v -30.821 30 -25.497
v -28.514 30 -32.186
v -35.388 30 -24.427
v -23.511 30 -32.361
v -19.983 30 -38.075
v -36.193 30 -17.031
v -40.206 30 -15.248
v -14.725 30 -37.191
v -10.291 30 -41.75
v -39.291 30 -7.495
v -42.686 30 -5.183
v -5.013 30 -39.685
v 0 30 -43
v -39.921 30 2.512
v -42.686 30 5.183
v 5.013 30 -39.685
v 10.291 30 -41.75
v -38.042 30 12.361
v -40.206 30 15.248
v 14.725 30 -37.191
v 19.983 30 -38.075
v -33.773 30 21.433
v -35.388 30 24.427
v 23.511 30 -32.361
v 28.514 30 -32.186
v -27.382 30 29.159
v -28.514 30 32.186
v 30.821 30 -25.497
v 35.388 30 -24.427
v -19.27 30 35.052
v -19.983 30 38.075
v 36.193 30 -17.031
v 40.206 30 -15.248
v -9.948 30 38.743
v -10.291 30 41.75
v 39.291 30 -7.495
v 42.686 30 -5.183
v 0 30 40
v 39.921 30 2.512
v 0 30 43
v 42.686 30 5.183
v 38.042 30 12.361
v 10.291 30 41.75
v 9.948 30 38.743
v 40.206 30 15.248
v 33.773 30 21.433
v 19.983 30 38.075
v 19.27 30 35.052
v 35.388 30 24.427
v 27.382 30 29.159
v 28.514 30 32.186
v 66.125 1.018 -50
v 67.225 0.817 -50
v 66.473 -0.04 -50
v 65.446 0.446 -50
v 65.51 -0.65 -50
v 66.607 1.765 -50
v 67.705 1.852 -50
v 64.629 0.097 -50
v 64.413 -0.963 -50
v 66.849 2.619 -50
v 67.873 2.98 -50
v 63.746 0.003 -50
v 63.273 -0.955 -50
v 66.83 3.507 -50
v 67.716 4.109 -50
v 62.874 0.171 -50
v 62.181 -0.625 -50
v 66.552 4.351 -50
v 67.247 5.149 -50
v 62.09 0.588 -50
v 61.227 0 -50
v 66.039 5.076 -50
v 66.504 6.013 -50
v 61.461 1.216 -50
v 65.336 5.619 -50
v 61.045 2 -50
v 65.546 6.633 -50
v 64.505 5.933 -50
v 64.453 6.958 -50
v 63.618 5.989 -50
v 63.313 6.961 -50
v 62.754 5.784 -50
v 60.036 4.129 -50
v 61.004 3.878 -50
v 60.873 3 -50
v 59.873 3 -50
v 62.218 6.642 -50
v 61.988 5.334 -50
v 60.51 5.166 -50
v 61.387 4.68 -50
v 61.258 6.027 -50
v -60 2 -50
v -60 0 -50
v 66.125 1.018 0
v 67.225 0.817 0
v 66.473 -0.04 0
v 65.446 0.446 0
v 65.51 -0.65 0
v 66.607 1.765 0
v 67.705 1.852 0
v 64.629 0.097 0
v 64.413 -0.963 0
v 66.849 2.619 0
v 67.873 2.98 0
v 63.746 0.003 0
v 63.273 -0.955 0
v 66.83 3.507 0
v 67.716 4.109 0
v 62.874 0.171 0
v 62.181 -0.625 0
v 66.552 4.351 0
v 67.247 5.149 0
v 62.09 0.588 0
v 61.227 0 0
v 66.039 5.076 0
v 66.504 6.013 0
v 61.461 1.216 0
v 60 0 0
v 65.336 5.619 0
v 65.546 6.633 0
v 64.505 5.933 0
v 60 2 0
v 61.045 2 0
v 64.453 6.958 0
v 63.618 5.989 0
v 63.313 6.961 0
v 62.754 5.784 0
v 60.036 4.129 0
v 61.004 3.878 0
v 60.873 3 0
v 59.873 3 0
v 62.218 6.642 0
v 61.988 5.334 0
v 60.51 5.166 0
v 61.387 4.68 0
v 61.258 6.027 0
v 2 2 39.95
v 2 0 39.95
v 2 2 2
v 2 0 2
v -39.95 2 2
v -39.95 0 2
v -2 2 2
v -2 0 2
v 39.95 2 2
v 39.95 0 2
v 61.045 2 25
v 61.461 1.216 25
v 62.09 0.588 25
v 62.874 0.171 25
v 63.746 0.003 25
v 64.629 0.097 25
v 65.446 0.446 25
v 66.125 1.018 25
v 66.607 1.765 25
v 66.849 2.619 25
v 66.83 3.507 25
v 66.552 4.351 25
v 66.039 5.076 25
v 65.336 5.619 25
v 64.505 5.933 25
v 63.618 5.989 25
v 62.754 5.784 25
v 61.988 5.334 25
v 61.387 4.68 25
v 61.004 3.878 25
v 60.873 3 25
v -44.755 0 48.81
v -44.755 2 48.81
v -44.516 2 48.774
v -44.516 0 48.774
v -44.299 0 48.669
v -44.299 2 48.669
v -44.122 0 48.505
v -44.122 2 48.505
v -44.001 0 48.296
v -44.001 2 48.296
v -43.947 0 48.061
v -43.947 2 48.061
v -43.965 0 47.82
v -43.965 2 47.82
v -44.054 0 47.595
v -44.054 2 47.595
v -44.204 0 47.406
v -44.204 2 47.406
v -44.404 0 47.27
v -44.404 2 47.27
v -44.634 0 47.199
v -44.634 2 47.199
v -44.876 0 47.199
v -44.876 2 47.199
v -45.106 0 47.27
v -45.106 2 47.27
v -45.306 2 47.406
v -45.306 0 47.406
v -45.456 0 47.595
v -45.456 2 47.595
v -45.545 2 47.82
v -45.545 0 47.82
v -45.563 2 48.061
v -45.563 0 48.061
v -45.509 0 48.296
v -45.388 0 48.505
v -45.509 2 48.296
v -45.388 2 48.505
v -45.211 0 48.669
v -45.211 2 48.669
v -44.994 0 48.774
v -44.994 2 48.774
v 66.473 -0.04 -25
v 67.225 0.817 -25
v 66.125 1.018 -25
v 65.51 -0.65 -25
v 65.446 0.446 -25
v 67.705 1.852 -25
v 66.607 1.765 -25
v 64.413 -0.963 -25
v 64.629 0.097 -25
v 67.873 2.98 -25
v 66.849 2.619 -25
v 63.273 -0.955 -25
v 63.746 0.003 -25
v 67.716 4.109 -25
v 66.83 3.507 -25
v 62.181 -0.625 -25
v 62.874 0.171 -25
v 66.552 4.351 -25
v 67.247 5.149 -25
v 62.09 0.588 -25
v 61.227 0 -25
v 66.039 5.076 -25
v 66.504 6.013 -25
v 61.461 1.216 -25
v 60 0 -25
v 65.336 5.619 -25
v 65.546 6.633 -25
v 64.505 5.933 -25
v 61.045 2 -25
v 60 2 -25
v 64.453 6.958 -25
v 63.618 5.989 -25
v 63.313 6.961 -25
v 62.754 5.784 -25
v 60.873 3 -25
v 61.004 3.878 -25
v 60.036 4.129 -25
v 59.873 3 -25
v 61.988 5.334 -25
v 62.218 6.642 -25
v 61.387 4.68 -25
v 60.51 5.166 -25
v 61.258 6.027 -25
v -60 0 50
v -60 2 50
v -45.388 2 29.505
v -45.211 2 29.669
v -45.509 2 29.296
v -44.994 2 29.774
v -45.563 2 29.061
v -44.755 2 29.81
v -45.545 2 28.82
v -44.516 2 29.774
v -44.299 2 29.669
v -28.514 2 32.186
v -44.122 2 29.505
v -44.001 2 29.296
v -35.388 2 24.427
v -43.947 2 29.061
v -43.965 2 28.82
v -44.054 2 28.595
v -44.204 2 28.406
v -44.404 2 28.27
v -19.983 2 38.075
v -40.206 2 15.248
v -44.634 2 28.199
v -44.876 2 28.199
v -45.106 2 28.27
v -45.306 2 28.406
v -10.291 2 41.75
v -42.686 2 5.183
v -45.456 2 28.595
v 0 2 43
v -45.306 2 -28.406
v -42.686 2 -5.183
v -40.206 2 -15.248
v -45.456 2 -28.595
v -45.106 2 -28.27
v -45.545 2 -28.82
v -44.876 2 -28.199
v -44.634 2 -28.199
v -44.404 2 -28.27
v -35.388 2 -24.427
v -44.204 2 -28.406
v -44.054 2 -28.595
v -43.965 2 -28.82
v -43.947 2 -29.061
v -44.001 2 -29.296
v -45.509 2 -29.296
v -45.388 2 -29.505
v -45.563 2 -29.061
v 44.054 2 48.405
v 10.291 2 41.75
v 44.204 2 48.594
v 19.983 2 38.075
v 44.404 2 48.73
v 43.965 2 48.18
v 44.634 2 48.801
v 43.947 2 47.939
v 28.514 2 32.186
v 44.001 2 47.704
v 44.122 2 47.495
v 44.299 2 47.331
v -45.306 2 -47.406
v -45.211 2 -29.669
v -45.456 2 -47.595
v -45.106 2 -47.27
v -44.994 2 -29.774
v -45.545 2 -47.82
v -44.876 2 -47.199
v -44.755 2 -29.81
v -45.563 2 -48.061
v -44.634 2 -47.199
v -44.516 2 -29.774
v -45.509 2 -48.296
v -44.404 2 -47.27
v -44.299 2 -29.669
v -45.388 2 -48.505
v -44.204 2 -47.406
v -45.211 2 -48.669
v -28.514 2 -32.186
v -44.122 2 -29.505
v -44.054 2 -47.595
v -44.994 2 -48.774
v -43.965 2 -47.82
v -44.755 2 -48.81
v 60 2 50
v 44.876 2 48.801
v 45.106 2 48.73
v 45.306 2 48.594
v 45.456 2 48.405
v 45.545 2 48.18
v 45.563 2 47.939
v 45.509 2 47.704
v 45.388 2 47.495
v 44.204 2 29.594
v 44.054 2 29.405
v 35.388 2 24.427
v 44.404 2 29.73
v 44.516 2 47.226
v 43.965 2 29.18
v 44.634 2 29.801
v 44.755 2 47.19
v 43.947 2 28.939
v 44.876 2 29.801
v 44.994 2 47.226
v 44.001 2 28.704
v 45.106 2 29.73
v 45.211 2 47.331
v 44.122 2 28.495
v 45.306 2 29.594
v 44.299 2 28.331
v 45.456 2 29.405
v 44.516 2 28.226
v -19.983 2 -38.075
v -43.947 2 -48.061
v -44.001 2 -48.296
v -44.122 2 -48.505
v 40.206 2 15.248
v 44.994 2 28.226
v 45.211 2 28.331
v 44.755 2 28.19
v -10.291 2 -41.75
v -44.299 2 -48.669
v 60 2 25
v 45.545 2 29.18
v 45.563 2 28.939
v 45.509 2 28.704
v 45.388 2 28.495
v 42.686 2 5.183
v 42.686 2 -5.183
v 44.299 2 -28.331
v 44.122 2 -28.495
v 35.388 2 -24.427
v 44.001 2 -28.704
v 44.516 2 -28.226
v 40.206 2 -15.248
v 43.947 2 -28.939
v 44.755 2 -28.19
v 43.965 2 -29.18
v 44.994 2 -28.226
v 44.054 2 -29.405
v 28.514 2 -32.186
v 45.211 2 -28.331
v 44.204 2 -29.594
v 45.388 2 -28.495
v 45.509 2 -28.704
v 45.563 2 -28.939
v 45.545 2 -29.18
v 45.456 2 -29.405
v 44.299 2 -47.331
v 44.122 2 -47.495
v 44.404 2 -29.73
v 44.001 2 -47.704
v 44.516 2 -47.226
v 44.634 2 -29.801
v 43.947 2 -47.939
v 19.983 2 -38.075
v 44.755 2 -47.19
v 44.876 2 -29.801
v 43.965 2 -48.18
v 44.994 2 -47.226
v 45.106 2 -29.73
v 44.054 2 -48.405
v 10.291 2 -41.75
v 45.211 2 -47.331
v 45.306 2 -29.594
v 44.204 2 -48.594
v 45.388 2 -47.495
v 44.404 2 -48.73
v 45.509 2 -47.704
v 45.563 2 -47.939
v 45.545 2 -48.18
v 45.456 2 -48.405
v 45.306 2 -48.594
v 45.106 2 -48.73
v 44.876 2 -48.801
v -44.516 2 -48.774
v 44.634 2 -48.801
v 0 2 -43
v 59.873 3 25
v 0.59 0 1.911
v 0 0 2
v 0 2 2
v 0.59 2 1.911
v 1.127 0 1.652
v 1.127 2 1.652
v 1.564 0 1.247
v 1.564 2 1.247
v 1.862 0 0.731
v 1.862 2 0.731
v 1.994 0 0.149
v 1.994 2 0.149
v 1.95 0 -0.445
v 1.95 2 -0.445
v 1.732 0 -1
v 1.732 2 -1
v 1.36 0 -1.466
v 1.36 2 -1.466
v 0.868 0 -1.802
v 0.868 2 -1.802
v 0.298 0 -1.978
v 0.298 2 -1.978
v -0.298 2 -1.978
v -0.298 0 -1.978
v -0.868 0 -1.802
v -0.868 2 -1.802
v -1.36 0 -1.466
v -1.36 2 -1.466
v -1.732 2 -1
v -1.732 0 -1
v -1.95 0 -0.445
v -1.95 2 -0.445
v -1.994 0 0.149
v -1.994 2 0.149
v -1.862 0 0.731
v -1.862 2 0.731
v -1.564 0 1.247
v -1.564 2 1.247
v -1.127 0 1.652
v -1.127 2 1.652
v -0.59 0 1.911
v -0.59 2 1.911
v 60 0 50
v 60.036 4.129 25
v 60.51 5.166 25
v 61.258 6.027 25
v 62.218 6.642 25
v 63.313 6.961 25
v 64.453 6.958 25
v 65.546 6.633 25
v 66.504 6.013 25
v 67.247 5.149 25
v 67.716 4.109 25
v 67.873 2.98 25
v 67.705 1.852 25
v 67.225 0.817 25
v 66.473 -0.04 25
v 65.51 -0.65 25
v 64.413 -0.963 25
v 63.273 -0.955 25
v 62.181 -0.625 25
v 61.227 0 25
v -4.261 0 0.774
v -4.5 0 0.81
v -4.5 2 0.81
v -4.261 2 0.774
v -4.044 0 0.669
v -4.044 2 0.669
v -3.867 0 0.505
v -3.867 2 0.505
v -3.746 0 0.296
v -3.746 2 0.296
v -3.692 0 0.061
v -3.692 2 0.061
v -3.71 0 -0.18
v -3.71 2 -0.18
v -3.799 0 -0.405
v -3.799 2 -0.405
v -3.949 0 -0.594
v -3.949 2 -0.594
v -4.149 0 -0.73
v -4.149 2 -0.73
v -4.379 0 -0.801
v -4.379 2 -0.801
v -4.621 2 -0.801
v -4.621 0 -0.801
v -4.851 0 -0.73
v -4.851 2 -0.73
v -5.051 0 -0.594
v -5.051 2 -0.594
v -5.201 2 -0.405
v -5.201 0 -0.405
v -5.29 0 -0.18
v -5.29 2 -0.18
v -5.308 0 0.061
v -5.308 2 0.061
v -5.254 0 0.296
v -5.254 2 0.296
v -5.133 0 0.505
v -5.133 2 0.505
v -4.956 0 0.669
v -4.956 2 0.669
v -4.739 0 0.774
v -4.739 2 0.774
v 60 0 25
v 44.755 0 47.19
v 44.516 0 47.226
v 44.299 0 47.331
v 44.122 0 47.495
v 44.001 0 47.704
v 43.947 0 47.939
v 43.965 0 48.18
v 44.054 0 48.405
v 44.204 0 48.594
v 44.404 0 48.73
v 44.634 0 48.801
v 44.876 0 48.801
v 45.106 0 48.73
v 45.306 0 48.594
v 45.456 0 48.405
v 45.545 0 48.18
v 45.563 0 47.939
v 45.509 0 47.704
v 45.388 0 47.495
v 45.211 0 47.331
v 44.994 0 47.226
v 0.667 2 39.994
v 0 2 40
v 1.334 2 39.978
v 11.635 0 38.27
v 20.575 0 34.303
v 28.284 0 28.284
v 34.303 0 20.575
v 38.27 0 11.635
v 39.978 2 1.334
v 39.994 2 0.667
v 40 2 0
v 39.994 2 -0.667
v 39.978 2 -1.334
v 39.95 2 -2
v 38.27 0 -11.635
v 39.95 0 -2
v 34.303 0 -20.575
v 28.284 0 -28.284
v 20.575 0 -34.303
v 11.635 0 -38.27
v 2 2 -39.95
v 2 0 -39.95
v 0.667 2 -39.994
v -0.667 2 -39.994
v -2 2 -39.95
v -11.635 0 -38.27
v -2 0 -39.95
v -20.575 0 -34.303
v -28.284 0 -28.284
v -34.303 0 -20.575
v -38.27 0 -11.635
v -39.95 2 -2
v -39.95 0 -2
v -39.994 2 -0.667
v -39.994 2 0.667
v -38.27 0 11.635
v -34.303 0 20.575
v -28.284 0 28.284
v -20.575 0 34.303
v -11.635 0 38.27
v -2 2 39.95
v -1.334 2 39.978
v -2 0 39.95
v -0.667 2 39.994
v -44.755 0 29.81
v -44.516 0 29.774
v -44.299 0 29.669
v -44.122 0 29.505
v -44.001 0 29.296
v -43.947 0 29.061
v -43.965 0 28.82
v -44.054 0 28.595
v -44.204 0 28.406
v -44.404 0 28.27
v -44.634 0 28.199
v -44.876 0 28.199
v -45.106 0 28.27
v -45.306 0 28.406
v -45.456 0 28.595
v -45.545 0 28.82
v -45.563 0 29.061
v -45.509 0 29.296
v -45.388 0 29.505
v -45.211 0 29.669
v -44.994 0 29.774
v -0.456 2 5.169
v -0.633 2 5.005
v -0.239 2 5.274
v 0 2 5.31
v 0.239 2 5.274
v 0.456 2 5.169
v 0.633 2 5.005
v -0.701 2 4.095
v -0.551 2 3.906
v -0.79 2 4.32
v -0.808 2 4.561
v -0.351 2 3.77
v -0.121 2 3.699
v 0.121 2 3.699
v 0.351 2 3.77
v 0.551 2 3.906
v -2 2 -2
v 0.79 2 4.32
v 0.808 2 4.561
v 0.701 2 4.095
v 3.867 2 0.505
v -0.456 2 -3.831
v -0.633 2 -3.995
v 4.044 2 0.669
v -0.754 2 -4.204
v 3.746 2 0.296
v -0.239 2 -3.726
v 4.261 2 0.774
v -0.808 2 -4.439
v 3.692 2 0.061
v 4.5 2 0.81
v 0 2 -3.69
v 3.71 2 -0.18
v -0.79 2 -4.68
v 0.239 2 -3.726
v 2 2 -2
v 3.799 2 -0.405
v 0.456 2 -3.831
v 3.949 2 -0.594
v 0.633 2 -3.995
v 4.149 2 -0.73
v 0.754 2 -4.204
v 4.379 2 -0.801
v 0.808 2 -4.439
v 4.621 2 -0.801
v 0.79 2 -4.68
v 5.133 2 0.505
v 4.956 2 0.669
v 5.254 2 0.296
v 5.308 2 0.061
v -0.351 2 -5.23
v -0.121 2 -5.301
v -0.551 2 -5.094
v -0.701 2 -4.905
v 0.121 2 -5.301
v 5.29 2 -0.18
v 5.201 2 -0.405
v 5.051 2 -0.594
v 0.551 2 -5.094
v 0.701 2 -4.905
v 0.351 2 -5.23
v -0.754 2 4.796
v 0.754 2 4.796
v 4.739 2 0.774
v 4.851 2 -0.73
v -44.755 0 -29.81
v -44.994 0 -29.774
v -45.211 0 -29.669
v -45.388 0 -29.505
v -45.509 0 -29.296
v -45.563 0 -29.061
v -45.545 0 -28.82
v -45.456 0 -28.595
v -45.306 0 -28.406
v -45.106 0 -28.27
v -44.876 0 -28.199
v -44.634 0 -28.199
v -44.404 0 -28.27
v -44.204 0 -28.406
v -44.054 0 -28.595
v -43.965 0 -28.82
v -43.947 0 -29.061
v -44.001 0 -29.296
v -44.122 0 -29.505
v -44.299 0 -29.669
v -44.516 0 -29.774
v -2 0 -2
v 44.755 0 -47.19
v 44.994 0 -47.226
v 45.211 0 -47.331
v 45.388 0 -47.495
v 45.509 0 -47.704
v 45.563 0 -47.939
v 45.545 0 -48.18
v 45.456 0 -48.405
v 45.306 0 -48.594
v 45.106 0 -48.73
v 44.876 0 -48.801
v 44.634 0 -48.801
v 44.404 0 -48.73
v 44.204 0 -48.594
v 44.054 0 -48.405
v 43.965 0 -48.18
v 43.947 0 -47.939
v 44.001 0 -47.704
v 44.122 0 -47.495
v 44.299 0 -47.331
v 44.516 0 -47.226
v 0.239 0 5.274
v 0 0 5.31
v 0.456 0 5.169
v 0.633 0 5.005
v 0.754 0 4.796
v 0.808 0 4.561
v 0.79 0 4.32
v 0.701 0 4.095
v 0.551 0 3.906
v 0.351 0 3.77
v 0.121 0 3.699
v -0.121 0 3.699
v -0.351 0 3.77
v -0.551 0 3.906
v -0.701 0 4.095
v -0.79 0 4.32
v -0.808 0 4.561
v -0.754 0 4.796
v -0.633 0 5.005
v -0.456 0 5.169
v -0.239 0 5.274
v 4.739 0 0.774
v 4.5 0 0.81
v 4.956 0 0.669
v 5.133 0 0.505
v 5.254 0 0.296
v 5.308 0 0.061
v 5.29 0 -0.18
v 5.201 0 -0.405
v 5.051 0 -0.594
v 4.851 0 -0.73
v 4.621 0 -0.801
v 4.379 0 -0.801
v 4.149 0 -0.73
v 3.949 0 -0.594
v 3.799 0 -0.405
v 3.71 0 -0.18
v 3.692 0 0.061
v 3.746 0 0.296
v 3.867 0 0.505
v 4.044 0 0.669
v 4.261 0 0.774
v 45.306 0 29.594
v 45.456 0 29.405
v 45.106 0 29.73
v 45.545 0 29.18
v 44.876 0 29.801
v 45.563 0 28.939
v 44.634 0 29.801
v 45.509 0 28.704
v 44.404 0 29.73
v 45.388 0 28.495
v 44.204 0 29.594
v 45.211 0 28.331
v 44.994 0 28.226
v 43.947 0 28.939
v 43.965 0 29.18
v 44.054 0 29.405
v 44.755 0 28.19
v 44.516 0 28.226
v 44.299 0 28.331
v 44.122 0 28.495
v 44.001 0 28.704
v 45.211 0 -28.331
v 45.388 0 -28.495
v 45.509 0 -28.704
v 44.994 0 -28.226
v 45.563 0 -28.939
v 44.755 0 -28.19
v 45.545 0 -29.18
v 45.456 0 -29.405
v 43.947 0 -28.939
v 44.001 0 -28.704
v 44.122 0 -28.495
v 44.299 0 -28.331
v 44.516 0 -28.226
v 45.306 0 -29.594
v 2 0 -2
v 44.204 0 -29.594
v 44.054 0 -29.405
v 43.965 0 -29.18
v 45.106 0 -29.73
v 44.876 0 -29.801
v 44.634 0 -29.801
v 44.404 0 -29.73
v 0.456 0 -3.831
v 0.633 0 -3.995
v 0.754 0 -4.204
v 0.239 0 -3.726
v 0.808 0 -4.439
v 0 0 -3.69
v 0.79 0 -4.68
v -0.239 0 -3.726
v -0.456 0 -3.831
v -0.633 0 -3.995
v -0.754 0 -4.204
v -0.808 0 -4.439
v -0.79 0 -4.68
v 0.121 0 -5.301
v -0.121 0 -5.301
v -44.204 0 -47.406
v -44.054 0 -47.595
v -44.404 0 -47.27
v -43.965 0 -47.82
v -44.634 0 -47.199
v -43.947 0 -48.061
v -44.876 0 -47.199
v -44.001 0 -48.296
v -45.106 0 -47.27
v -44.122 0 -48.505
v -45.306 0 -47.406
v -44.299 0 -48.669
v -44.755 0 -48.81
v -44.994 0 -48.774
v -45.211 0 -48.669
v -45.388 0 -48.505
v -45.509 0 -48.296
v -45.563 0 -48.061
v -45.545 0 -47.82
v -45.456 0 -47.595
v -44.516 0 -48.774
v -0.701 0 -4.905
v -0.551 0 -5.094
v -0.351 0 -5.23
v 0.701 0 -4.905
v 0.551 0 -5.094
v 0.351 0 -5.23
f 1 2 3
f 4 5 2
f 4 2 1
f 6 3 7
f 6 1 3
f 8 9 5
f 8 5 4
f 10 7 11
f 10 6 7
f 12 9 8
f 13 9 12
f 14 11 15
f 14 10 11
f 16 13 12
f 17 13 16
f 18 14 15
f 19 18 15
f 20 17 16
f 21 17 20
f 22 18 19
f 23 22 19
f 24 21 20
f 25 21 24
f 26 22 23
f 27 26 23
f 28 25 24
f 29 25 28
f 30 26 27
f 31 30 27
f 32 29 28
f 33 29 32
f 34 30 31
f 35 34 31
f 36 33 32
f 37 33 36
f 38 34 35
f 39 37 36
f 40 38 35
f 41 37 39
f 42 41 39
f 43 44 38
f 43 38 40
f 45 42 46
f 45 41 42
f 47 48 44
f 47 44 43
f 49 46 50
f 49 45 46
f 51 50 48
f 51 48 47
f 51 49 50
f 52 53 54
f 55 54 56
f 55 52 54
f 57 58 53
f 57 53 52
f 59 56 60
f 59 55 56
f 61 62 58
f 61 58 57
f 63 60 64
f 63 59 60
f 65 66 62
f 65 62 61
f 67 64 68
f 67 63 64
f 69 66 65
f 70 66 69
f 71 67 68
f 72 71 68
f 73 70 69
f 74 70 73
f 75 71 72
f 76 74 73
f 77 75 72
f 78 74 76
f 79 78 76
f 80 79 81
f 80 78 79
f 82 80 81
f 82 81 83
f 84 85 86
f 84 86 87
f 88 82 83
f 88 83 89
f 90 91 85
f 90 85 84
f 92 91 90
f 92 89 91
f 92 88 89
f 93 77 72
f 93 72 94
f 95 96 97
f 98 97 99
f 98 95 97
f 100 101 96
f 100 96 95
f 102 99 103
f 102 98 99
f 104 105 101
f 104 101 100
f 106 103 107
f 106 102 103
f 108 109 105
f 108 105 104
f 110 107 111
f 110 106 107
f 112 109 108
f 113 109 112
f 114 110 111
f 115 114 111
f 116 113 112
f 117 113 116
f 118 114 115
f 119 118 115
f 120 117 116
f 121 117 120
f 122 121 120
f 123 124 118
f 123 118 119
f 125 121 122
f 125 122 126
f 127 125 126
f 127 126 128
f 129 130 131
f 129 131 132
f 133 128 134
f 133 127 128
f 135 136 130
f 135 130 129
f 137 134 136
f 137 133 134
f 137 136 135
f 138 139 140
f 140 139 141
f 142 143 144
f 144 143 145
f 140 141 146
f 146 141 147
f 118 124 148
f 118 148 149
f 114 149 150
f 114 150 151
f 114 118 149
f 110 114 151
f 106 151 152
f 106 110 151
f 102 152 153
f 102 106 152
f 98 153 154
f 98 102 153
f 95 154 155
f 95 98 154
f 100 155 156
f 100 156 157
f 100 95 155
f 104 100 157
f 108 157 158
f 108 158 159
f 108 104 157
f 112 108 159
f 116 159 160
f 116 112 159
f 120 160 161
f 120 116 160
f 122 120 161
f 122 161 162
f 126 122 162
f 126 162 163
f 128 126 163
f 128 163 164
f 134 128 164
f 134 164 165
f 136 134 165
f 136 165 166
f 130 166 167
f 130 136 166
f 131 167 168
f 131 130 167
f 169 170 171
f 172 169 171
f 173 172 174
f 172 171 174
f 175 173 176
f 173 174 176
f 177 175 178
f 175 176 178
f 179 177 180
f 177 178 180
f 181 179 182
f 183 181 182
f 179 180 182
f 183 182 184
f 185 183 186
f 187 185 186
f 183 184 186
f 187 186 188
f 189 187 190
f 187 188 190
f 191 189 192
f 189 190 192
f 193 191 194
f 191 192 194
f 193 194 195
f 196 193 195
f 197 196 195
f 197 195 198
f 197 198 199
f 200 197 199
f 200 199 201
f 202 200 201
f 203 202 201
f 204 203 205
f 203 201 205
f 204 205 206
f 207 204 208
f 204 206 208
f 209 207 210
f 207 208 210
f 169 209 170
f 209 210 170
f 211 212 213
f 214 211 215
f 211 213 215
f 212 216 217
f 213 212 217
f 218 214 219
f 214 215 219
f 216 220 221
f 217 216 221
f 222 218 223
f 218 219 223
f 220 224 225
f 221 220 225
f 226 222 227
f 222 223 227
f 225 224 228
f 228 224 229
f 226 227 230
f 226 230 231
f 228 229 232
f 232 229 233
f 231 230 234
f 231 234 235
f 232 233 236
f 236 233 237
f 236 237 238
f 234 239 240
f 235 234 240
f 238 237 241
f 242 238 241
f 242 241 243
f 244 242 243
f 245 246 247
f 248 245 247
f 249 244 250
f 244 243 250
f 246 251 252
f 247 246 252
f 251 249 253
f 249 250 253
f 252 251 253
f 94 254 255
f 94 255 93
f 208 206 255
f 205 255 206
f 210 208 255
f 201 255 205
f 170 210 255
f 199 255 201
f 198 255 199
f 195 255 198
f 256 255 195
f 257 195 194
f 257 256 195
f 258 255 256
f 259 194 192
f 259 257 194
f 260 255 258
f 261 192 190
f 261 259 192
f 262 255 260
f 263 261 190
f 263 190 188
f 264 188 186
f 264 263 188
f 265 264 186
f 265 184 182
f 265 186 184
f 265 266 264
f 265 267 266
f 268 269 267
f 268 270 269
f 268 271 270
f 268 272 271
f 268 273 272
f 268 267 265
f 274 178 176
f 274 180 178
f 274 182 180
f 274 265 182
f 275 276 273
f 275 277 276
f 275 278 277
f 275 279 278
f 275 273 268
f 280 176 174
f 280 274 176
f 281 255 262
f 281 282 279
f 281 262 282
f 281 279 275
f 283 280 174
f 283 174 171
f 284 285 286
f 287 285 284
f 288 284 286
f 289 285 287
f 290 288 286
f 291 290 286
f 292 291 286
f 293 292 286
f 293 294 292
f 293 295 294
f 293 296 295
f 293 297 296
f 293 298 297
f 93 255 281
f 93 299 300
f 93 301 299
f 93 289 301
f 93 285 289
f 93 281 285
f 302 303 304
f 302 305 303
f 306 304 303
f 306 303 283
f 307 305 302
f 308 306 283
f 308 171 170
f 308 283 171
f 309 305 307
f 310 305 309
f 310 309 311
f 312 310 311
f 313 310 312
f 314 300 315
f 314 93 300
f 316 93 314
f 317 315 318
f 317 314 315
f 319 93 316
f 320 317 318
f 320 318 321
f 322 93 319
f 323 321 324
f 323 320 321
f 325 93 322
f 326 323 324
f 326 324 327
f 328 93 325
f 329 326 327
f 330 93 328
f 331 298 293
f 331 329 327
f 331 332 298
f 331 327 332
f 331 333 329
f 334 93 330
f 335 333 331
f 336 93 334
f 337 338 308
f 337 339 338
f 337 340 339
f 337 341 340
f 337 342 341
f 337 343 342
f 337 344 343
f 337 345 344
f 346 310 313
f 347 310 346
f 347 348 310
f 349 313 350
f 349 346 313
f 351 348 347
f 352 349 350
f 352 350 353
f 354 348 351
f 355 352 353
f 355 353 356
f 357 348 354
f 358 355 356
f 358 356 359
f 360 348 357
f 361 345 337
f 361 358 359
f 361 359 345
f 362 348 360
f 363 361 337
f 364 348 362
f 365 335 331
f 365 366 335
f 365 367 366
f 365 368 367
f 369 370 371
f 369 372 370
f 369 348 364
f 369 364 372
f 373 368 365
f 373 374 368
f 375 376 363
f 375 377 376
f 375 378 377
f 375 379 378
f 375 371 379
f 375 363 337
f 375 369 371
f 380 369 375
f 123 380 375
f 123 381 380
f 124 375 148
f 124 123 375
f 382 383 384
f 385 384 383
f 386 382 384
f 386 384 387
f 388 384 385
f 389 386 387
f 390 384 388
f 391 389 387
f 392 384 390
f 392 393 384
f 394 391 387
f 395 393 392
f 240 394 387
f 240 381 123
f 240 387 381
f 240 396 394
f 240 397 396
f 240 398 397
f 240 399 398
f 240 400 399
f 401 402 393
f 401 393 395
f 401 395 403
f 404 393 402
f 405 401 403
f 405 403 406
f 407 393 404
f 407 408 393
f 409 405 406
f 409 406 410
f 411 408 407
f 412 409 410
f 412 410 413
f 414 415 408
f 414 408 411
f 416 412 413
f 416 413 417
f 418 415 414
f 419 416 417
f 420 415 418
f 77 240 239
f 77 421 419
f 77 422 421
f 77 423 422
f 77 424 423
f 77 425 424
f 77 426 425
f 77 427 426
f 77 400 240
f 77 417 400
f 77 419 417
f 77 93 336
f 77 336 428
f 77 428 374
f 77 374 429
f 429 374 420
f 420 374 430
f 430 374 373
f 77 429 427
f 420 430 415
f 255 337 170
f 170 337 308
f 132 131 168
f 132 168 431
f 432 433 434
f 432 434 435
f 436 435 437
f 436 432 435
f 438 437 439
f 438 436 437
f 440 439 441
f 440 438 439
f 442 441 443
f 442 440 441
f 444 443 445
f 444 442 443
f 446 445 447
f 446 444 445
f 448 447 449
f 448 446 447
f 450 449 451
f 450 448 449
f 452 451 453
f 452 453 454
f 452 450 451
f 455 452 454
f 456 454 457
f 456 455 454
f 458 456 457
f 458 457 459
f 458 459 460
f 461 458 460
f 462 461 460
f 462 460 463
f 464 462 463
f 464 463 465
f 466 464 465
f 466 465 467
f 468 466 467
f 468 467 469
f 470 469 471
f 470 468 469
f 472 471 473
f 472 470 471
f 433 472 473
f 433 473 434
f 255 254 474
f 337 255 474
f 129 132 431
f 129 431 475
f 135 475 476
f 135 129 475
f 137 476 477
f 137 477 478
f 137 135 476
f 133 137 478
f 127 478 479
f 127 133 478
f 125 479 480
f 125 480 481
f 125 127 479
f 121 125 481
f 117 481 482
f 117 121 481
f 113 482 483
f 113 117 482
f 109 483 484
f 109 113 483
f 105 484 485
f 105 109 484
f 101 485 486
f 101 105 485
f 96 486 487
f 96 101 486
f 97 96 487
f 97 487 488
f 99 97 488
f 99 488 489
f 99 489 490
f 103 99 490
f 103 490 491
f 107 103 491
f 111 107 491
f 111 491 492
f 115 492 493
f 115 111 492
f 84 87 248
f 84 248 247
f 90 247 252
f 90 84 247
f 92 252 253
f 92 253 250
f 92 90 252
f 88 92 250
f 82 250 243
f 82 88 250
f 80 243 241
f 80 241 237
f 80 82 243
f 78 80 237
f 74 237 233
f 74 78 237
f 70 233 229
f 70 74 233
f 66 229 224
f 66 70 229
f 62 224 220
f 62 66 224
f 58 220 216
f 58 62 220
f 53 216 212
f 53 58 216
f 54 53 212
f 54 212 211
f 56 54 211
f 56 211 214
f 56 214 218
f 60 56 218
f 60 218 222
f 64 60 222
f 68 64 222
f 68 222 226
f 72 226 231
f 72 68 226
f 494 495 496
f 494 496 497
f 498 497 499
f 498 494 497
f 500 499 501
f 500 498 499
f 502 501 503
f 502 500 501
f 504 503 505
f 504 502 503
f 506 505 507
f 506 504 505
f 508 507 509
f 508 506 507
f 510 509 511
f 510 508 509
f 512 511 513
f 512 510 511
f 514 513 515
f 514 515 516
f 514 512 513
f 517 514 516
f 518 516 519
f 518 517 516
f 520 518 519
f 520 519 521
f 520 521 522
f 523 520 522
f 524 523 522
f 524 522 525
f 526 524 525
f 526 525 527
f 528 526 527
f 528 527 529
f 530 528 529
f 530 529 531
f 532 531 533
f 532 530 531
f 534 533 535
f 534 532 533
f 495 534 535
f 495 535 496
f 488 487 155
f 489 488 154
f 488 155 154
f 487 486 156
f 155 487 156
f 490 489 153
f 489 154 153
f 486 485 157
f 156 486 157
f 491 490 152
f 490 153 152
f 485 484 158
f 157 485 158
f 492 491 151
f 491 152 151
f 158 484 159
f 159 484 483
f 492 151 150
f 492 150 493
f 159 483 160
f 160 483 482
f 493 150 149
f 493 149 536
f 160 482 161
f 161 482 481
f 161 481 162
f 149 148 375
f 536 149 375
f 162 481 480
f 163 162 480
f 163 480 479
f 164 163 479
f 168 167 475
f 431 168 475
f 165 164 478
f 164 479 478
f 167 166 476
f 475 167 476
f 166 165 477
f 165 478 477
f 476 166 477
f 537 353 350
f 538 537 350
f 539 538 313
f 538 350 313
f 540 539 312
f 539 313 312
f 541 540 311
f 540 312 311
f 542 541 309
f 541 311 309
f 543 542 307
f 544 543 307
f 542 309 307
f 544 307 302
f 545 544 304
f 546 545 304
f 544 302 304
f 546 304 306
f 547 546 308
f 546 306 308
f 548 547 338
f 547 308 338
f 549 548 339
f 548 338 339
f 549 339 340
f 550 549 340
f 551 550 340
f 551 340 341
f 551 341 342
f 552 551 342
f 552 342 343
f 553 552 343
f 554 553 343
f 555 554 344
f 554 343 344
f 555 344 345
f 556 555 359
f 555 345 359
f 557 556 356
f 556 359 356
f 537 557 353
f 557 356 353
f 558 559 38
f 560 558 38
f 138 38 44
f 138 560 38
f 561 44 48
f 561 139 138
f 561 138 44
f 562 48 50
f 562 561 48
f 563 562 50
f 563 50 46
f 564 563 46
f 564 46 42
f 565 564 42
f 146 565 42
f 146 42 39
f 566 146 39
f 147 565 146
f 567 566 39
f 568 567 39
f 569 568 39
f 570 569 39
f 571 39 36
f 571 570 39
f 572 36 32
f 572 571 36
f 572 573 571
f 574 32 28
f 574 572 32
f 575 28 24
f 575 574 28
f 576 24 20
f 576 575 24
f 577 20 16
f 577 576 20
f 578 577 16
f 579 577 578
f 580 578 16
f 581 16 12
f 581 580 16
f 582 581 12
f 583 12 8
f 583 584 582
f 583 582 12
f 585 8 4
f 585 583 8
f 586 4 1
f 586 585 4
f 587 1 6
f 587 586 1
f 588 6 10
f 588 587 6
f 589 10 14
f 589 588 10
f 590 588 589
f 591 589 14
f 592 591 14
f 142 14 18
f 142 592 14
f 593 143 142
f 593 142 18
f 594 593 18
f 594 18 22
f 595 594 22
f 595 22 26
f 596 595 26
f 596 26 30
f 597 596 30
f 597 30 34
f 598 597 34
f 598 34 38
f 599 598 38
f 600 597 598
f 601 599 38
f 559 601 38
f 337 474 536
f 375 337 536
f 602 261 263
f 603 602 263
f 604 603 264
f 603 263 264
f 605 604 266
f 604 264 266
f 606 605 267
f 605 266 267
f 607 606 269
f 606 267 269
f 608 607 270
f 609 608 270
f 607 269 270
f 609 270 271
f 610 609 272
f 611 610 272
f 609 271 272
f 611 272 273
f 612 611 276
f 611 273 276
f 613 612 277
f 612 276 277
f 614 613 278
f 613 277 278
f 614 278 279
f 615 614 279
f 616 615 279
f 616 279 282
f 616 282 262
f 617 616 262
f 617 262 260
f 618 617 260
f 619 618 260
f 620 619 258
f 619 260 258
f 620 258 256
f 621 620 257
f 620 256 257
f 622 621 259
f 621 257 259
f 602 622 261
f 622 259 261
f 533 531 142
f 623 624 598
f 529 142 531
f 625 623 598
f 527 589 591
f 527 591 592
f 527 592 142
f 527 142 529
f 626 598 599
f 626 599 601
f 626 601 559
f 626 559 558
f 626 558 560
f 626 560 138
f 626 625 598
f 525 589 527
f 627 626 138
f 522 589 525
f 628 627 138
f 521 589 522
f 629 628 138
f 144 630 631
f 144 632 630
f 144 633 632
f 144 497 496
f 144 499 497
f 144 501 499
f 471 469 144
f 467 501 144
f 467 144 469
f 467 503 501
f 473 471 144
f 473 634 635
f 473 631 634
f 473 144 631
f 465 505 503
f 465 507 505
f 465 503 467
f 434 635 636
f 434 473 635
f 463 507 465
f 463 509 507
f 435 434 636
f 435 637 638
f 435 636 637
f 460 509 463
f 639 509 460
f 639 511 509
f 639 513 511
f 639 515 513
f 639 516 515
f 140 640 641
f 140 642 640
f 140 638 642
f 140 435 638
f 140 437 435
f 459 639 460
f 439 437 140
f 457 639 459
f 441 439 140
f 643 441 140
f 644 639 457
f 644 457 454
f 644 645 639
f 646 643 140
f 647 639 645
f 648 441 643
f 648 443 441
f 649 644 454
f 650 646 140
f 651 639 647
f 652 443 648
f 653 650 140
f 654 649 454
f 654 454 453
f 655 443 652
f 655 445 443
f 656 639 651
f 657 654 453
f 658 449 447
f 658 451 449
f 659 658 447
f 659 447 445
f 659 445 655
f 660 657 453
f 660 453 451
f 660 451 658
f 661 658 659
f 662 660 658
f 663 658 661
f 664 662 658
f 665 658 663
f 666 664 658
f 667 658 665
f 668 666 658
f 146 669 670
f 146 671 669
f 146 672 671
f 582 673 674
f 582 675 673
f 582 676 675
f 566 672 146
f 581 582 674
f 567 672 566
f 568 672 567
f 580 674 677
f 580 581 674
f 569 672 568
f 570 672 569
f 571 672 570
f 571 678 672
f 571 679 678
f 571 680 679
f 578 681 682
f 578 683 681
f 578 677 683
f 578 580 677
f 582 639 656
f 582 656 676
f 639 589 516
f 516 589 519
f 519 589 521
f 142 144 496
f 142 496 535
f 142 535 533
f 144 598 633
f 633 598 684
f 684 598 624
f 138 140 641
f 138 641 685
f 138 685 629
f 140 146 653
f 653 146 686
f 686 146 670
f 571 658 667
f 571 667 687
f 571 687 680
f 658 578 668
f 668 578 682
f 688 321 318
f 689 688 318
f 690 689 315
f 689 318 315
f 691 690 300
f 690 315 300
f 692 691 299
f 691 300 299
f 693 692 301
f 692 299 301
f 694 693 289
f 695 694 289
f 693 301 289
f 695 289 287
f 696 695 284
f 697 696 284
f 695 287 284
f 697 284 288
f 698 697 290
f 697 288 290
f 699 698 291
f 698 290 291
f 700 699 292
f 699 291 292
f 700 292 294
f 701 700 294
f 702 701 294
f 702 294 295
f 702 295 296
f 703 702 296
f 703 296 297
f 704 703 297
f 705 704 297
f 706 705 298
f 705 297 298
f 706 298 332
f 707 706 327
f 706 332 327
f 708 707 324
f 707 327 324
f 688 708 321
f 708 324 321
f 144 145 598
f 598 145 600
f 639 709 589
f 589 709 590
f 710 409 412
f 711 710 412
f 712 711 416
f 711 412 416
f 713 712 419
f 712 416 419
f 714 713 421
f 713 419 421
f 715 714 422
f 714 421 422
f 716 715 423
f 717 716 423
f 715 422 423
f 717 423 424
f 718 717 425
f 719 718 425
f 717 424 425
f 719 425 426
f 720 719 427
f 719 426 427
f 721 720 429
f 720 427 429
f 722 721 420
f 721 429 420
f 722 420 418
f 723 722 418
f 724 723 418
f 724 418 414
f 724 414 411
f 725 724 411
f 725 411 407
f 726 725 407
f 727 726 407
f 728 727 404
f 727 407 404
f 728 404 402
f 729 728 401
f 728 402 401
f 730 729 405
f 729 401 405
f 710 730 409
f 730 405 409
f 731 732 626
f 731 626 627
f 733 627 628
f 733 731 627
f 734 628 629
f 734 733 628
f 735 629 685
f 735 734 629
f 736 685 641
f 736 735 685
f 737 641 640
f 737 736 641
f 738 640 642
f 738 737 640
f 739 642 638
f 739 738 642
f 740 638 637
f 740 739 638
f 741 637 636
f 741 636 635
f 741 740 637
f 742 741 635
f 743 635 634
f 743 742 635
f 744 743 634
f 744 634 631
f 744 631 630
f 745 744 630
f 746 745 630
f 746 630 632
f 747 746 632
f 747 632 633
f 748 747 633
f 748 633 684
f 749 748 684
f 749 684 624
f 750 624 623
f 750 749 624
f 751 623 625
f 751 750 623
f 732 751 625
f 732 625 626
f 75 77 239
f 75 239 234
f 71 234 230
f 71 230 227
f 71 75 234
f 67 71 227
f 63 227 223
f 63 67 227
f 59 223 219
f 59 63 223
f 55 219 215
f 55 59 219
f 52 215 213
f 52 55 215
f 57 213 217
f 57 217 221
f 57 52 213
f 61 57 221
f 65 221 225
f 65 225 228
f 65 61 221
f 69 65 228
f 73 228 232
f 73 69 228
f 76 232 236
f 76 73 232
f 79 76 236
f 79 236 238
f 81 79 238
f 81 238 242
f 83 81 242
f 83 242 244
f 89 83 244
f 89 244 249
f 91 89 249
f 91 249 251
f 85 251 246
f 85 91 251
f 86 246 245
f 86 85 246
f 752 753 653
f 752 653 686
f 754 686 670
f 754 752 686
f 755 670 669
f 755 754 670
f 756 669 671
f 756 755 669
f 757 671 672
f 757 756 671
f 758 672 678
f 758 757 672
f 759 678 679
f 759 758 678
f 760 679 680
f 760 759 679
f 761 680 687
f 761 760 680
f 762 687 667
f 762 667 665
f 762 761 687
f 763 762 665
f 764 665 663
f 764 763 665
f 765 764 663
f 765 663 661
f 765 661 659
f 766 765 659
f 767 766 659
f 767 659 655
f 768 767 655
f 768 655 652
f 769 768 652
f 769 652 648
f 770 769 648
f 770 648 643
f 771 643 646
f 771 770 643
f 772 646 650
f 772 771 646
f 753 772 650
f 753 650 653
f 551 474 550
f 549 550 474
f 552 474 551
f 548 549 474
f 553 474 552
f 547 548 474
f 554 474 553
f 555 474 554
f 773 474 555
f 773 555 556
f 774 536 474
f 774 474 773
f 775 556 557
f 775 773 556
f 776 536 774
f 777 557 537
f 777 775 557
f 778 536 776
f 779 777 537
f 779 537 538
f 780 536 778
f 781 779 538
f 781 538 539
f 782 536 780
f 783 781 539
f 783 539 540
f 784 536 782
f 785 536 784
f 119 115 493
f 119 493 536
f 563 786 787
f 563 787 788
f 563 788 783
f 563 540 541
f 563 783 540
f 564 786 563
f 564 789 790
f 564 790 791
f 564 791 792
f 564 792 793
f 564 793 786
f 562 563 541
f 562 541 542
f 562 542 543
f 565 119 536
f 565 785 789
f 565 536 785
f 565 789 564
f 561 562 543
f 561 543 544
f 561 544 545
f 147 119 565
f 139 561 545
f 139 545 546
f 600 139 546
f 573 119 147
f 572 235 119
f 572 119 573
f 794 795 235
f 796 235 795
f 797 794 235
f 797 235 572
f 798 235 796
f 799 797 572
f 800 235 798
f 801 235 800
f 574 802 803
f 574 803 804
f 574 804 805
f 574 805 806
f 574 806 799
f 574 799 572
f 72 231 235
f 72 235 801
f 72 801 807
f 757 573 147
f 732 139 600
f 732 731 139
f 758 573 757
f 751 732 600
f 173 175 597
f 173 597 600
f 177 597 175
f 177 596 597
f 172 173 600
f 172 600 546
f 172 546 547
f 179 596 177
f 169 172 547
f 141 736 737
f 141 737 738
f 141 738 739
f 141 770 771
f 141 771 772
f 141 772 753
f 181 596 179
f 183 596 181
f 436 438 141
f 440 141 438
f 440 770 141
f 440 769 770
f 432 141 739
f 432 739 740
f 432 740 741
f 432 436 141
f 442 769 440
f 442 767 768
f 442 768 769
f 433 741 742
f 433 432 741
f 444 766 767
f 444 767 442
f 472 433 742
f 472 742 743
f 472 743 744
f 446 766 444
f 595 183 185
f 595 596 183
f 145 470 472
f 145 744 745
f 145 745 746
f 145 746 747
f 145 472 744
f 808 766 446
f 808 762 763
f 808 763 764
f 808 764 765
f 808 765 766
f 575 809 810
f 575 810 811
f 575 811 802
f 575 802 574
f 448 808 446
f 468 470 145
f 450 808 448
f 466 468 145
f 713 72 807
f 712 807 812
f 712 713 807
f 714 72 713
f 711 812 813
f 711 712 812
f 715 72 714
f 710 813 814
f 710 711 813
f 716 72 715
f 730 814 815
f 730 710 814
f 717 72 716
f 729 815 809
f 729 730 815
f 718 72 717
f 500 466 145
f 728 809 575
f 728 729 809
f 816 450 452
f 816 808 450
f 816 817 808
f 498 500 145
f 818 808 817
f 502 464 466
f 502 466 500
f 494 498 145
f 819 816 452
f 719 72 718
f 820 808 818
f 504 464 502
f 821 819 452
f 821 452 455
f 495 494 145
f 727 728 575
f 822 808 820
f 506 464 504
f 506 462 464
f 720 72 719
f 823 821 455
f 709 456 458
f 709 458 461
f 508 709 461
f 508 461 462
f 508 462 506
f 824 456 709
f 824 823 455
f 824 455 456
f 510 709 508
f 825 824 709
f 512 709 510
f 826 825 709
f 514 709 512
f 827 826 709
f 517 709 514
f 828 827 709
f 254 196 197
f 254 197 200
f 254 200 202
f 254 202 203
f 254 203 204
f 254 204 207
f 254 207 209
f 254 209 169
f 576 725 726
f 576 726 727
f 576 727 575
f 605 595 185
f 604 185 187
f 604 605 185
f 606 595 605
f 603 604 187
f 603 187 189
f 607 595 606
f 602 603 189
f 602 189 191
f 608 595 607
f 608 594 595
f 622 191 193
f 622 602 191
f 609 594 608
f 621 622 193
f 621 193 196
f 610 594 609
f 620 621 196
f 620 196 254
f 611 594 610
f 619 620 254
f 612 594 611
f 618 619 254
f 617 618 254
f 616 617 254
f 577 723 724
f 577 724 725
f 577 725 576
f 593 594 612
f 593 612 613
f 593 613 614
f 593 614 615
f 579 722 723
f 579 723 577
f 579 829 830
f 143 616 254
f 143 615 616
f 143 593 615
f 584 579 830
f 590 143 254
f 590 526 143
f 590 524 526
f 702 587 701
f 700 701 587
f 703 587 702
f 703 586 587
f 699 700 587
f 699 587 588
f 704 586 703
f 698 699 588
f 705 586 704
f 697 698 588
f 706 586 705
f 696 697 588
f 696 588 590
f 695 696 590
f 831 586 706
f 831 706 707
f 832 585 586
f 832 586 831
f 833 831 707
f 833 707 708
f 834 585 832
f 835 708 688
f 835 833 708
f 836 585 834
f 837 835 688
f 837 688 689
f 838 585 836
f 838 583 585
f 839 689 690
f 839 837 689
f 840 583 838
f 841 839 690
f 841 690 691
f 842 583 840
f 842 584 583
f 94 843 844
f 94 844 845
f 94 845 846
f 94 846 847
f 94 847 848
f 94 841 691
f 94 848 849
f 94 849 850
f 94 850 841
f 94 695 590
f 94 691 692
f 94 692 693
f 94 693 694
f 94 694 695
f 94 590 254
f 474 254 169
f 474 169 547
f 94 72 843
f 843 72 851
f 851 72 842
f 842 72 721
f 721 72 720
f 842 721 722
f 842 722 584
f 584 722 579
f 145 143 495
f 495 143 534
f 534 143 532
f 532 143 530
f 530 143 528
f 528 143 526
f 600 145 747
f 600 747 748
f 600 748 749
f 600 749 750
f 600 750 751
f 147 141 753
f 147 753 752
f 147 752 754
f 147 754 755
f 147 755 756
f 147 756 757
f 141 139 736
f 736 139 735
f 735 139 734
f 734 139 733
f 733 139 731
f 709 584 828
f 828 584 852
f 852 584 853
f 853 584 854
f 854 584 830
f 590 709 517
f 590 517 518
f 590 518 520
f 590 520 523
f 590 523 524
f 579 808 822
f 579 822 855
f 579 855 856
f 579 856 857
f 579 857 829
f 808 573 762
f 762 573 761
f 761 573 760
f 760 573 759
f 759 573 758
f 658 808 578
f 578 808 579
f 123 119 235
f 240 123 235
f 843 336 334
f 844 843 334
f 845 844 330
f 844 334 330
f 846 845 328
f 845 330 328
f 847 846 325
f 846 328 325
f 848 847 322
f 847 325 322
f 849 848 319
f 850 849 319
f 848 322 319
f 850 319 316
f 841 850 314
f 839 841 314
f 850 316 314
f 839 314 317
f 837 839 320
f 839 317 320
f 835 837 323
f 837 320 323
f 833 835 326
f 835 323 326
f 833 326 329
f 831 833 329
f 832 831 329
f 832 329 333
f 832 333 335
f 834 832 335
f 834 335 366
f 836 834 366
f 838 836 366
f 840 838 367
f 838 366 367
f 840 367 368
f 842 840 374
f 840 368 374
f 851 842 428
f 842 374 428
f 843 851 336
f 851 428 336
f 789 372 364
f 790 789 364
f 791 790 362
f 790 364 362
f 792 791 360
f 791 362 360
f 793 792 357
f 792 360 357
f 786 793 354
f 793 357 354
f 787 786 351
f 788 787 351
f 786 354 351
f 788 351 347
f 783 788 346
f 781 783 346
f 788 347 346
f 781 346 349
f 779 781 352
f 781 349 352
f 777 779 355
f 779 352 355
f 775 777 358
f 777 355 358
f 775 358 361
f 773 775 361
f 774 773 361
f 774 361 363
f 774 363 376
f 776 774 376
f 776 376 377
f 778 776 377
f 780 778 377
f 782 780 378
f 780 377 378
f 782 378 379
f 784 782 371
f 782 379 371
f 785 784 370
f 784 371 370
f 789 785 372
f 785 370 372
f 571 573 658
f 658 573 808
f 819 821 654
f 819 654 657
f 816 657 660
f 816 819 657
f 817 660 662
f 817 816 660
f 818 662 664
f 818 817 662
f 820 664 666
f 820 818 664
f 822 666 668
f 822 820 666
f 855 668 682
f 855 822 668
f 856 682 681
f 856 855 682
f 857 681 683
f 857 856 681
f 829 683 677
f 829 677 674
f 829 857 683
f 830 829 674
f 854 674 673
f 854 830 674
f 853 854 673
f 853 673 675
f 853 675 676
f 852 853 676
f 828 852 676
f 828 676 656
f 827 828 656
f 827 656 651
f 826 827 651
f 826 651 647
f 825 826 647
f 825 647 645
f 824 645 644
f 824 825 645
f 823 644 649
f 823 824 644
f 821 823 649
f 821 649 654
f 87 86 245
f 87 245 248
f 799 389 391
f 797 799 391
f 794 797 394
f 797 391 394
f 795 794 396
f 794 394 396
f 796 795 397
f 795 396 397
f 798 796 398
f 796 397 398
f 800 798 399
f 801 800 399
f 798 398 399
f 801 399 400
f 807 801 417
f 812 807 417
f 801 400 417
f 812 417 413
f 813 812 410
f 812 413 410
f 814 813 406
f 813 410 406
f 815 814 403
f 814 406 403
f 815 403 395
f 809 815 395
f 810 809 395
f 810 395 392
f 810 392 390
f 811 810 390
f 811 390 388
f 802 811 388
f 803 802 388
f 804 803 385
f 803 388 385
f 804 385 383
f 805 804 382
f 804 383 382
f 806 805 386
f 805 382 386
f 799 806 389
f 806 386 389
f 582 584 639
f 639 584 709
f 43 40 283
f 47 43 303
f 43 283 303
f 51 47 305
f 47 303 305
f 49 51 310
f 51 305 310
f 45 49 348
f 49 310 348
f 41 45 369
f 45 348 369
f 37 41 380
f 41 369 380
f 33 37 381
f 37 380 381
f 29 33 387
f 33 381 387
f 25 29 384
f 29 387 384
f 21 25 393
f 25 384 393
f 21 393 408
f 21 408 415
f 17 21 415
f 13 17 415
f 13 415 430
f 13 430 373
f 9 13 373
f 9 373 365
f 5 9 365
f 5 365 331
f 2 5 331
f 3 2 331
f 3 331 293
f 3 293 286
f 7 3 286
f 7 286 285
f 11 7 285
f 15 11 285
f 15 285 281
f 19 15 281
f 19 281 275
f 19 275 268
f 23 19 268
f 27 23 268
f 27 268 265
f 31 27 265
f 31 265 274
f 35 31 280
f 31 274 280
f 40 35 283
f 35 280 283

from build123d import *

# Parameters (mm, degrees)
CROQUIS1_R              = 43
CROQUIS1_R_2            = 40
SALIENTE_EXTRUIR1_DEPTH = 30
CROQUIS3_R              = 0.81
CROQUIS3_R_2            = 2
SALIENTE_EXTRUIR2_DEPTH = 2
CROQUIS4_W              = 120
CROQUIS4_H              = 100
CROQUIS4_R              = 43
SALIENTE_EXTRUIR3_DEPTH = 2
CROQUIS5_R              = 0.81
CORTAR_EXTRUIR1_DEPTH   = 2
SALIENTE_EXTRUIR8_DEPTH = 25
MATRIZL2_COUNT          = 2
MATRIZL2_PITCH          = 50


with BuildPart() as part:
    # Croquis1 → Saliente-Extruir1 (new body)
    with BuildSketch(Plane(origin=(0, 0, 0), x_dir=(1, 0, 0), z_dir=(0, 1, 0))):
        with Locations(Location((0, 0, 0), (0, 0, 270))):
            Circle(CROQUIS1_R)
        with Locations(Location((0, 0, 0), (0, 0, 270))):
            Circle(CROQUIS1_R_2, mode=Mode.SUBTRACT)
    extrude(amount=SALIENTE_EXTRUIR1_DEPTH)

    # Croquis3 → Saliente-Extruir2 (add)
    with BuildSketch(Plane(origin=(0, 0, 0), x_dir=(1, 0, 0), z_dir=(0, 1, 0))):
        with BuildLine():
            Line((-2, 39.949968711), (-2, 2))
            Line((-2, 2), (-39.949968711, 2))
            ThreePointArc((-39.949968711, 2), (-40, 0), (-39.949968711, -2))
            Line((-39.949968711, -2), (-2, -2))
            Line((-2, -2), (-2, -39.949968711))
            ThreePointArc((-2, -39.949968711), (0, -40), (2, -39.949968711))
            Line((2, -39.949968711), (2, -2))
            Line((2, -2), (39.949968711, -2))
            ThreePointArc((39.949968711, -2), (39.987490222, -1.000312842), (40, 0))
            ThreePointArc((40, 0), (39.987490222, 1.000312842), (39.949968711, 2))
            Line((39.949968711, 2), (2, 2))
            Line((2, 2), (2, 39.949968711))
            ThreePointArc((2, 39.949968711), (0, 40), (-2, 39.949968711))
        make_face()
        with Locations(Location((0, -4.5, 0), (0, 0, 270))):
            Circle(CROQUIS3_R, mode=Mode.SUBTRACT)
        with Locations(Location((-4.5, 0, 0), (0, 0, 270))):
            Circle(CROQUIS3_R, mode=Mode.SUBTRACT)
        with Locations(Location((0, 0, 0), (0, 0, 270))):
            Circle(CROQUIS3_R_2, mode=Mode.SUBTRACT)
        with Locations(Location((4.5, 0, 0), (0, 0, 270))):
            Circle(CROQUIS3_R, mode=Mode.SUBTRACT)
        with Locations(Location((0, 4.5, 0), (0, 0, 270))):
            Circle(CROQUIS3_R, mode=Mode.SUBTRACT)
    extrude(amount=SALIENTE_EXTRUIR2_DEPTH)

    # Croquis4 → Saliente-Extruir3 (add)
    with BuildSketch(Plane(origin=(0, 0, 0), x_dir=(1, 0, 0), z_dir=(0, 1, 0))):
        Rectangle(CROQUIS4_W, CROQUIS4_H)
        with Locations(Location((0, 0, 0), (0, 0, 90))):
            Circle(CROQUIS4_R, mode=Mode.SUBTRACT)
    extrude(amount=SALIENTE_EXTRUIR3_DEPTH)

    # Croquis5 → Cortar-Extruir1 (cut)
    with BuildSketch(Plane(origin=(0, 2, 0), x_dir=(1, 0, 0), z_dir=(0, 1, 0))):
        with Locations(Location((-44.755, -48, 0), (0, 0, 270))):
            Circle(CROQUIS5_R)
        with Locations(Location((-44.755, -29, 0), (0, 0, 270))):
            Circle(CROQUIS5_R)
        with Locations(Location((-44.755, 29, 0), (0, 0, 90))):
            Circle(CROQUIS5_R)
        with Locations(Location((-44.755, 48, 0), (0, 0, 90))):
            Circle(CROQUIS5_R)
        with Locations(Location((44.755, -48, 0), (0, 0, 90))):
            Circle(CROQUIS5_R)
        with Locations(Location((44.755, -29, 0), (0, 0, 90))):
            Circle(CROQUIS5_R)
        with Locations(Location((44.755, 29, 0), (0, 0, 270))):
            Circle(CROQUIS5_R)
        with Locations(Location((44.755, 48, 0), (0, 0, 270))):
            Circle(CROQUIS5_R)
    extrude(amount=-CORTAR_EXTRUIR1_DEPTH, mode=Mode.SUBTRACT)

    # Croquis7 → Saliente-Extruir8 (add)
    with BuildSketch(Plane(origin=(0, 0, -50), x_dir=(-1, 0, 0), z_dir=(0, 0, -1))):
        with BuildLine():
            Line((-60, 2), (-61.044556221, 2))
            ThreePointArc((-61.044556221, 2), (-66.829779025, 3.507305936), (-60.872983346, 3))
            Line((-60.872983346, 3), (-59.872983346, 3))
            ThreePointArc((-59.872983346, 3), (-67.518734657, 4.645751311), (-61.227232035, 0))
            Line((-61.227232035, 0), (-60, 0))
            Line((-60, 0), (-60, 2))
        make_face()
    saliente_extruir8 = extrude(amount=-SALIENTE_EXTRUIR8_DEPTH)

    # MatrizL2: Saliente-Extruir8 ×2
    with Locations(*[(0, 0, i * MATRIZL2_PITCH) for i in range(1, MATRIZL2_COUNT)]):
        add(saliente_extruir8)


solid = part.part
